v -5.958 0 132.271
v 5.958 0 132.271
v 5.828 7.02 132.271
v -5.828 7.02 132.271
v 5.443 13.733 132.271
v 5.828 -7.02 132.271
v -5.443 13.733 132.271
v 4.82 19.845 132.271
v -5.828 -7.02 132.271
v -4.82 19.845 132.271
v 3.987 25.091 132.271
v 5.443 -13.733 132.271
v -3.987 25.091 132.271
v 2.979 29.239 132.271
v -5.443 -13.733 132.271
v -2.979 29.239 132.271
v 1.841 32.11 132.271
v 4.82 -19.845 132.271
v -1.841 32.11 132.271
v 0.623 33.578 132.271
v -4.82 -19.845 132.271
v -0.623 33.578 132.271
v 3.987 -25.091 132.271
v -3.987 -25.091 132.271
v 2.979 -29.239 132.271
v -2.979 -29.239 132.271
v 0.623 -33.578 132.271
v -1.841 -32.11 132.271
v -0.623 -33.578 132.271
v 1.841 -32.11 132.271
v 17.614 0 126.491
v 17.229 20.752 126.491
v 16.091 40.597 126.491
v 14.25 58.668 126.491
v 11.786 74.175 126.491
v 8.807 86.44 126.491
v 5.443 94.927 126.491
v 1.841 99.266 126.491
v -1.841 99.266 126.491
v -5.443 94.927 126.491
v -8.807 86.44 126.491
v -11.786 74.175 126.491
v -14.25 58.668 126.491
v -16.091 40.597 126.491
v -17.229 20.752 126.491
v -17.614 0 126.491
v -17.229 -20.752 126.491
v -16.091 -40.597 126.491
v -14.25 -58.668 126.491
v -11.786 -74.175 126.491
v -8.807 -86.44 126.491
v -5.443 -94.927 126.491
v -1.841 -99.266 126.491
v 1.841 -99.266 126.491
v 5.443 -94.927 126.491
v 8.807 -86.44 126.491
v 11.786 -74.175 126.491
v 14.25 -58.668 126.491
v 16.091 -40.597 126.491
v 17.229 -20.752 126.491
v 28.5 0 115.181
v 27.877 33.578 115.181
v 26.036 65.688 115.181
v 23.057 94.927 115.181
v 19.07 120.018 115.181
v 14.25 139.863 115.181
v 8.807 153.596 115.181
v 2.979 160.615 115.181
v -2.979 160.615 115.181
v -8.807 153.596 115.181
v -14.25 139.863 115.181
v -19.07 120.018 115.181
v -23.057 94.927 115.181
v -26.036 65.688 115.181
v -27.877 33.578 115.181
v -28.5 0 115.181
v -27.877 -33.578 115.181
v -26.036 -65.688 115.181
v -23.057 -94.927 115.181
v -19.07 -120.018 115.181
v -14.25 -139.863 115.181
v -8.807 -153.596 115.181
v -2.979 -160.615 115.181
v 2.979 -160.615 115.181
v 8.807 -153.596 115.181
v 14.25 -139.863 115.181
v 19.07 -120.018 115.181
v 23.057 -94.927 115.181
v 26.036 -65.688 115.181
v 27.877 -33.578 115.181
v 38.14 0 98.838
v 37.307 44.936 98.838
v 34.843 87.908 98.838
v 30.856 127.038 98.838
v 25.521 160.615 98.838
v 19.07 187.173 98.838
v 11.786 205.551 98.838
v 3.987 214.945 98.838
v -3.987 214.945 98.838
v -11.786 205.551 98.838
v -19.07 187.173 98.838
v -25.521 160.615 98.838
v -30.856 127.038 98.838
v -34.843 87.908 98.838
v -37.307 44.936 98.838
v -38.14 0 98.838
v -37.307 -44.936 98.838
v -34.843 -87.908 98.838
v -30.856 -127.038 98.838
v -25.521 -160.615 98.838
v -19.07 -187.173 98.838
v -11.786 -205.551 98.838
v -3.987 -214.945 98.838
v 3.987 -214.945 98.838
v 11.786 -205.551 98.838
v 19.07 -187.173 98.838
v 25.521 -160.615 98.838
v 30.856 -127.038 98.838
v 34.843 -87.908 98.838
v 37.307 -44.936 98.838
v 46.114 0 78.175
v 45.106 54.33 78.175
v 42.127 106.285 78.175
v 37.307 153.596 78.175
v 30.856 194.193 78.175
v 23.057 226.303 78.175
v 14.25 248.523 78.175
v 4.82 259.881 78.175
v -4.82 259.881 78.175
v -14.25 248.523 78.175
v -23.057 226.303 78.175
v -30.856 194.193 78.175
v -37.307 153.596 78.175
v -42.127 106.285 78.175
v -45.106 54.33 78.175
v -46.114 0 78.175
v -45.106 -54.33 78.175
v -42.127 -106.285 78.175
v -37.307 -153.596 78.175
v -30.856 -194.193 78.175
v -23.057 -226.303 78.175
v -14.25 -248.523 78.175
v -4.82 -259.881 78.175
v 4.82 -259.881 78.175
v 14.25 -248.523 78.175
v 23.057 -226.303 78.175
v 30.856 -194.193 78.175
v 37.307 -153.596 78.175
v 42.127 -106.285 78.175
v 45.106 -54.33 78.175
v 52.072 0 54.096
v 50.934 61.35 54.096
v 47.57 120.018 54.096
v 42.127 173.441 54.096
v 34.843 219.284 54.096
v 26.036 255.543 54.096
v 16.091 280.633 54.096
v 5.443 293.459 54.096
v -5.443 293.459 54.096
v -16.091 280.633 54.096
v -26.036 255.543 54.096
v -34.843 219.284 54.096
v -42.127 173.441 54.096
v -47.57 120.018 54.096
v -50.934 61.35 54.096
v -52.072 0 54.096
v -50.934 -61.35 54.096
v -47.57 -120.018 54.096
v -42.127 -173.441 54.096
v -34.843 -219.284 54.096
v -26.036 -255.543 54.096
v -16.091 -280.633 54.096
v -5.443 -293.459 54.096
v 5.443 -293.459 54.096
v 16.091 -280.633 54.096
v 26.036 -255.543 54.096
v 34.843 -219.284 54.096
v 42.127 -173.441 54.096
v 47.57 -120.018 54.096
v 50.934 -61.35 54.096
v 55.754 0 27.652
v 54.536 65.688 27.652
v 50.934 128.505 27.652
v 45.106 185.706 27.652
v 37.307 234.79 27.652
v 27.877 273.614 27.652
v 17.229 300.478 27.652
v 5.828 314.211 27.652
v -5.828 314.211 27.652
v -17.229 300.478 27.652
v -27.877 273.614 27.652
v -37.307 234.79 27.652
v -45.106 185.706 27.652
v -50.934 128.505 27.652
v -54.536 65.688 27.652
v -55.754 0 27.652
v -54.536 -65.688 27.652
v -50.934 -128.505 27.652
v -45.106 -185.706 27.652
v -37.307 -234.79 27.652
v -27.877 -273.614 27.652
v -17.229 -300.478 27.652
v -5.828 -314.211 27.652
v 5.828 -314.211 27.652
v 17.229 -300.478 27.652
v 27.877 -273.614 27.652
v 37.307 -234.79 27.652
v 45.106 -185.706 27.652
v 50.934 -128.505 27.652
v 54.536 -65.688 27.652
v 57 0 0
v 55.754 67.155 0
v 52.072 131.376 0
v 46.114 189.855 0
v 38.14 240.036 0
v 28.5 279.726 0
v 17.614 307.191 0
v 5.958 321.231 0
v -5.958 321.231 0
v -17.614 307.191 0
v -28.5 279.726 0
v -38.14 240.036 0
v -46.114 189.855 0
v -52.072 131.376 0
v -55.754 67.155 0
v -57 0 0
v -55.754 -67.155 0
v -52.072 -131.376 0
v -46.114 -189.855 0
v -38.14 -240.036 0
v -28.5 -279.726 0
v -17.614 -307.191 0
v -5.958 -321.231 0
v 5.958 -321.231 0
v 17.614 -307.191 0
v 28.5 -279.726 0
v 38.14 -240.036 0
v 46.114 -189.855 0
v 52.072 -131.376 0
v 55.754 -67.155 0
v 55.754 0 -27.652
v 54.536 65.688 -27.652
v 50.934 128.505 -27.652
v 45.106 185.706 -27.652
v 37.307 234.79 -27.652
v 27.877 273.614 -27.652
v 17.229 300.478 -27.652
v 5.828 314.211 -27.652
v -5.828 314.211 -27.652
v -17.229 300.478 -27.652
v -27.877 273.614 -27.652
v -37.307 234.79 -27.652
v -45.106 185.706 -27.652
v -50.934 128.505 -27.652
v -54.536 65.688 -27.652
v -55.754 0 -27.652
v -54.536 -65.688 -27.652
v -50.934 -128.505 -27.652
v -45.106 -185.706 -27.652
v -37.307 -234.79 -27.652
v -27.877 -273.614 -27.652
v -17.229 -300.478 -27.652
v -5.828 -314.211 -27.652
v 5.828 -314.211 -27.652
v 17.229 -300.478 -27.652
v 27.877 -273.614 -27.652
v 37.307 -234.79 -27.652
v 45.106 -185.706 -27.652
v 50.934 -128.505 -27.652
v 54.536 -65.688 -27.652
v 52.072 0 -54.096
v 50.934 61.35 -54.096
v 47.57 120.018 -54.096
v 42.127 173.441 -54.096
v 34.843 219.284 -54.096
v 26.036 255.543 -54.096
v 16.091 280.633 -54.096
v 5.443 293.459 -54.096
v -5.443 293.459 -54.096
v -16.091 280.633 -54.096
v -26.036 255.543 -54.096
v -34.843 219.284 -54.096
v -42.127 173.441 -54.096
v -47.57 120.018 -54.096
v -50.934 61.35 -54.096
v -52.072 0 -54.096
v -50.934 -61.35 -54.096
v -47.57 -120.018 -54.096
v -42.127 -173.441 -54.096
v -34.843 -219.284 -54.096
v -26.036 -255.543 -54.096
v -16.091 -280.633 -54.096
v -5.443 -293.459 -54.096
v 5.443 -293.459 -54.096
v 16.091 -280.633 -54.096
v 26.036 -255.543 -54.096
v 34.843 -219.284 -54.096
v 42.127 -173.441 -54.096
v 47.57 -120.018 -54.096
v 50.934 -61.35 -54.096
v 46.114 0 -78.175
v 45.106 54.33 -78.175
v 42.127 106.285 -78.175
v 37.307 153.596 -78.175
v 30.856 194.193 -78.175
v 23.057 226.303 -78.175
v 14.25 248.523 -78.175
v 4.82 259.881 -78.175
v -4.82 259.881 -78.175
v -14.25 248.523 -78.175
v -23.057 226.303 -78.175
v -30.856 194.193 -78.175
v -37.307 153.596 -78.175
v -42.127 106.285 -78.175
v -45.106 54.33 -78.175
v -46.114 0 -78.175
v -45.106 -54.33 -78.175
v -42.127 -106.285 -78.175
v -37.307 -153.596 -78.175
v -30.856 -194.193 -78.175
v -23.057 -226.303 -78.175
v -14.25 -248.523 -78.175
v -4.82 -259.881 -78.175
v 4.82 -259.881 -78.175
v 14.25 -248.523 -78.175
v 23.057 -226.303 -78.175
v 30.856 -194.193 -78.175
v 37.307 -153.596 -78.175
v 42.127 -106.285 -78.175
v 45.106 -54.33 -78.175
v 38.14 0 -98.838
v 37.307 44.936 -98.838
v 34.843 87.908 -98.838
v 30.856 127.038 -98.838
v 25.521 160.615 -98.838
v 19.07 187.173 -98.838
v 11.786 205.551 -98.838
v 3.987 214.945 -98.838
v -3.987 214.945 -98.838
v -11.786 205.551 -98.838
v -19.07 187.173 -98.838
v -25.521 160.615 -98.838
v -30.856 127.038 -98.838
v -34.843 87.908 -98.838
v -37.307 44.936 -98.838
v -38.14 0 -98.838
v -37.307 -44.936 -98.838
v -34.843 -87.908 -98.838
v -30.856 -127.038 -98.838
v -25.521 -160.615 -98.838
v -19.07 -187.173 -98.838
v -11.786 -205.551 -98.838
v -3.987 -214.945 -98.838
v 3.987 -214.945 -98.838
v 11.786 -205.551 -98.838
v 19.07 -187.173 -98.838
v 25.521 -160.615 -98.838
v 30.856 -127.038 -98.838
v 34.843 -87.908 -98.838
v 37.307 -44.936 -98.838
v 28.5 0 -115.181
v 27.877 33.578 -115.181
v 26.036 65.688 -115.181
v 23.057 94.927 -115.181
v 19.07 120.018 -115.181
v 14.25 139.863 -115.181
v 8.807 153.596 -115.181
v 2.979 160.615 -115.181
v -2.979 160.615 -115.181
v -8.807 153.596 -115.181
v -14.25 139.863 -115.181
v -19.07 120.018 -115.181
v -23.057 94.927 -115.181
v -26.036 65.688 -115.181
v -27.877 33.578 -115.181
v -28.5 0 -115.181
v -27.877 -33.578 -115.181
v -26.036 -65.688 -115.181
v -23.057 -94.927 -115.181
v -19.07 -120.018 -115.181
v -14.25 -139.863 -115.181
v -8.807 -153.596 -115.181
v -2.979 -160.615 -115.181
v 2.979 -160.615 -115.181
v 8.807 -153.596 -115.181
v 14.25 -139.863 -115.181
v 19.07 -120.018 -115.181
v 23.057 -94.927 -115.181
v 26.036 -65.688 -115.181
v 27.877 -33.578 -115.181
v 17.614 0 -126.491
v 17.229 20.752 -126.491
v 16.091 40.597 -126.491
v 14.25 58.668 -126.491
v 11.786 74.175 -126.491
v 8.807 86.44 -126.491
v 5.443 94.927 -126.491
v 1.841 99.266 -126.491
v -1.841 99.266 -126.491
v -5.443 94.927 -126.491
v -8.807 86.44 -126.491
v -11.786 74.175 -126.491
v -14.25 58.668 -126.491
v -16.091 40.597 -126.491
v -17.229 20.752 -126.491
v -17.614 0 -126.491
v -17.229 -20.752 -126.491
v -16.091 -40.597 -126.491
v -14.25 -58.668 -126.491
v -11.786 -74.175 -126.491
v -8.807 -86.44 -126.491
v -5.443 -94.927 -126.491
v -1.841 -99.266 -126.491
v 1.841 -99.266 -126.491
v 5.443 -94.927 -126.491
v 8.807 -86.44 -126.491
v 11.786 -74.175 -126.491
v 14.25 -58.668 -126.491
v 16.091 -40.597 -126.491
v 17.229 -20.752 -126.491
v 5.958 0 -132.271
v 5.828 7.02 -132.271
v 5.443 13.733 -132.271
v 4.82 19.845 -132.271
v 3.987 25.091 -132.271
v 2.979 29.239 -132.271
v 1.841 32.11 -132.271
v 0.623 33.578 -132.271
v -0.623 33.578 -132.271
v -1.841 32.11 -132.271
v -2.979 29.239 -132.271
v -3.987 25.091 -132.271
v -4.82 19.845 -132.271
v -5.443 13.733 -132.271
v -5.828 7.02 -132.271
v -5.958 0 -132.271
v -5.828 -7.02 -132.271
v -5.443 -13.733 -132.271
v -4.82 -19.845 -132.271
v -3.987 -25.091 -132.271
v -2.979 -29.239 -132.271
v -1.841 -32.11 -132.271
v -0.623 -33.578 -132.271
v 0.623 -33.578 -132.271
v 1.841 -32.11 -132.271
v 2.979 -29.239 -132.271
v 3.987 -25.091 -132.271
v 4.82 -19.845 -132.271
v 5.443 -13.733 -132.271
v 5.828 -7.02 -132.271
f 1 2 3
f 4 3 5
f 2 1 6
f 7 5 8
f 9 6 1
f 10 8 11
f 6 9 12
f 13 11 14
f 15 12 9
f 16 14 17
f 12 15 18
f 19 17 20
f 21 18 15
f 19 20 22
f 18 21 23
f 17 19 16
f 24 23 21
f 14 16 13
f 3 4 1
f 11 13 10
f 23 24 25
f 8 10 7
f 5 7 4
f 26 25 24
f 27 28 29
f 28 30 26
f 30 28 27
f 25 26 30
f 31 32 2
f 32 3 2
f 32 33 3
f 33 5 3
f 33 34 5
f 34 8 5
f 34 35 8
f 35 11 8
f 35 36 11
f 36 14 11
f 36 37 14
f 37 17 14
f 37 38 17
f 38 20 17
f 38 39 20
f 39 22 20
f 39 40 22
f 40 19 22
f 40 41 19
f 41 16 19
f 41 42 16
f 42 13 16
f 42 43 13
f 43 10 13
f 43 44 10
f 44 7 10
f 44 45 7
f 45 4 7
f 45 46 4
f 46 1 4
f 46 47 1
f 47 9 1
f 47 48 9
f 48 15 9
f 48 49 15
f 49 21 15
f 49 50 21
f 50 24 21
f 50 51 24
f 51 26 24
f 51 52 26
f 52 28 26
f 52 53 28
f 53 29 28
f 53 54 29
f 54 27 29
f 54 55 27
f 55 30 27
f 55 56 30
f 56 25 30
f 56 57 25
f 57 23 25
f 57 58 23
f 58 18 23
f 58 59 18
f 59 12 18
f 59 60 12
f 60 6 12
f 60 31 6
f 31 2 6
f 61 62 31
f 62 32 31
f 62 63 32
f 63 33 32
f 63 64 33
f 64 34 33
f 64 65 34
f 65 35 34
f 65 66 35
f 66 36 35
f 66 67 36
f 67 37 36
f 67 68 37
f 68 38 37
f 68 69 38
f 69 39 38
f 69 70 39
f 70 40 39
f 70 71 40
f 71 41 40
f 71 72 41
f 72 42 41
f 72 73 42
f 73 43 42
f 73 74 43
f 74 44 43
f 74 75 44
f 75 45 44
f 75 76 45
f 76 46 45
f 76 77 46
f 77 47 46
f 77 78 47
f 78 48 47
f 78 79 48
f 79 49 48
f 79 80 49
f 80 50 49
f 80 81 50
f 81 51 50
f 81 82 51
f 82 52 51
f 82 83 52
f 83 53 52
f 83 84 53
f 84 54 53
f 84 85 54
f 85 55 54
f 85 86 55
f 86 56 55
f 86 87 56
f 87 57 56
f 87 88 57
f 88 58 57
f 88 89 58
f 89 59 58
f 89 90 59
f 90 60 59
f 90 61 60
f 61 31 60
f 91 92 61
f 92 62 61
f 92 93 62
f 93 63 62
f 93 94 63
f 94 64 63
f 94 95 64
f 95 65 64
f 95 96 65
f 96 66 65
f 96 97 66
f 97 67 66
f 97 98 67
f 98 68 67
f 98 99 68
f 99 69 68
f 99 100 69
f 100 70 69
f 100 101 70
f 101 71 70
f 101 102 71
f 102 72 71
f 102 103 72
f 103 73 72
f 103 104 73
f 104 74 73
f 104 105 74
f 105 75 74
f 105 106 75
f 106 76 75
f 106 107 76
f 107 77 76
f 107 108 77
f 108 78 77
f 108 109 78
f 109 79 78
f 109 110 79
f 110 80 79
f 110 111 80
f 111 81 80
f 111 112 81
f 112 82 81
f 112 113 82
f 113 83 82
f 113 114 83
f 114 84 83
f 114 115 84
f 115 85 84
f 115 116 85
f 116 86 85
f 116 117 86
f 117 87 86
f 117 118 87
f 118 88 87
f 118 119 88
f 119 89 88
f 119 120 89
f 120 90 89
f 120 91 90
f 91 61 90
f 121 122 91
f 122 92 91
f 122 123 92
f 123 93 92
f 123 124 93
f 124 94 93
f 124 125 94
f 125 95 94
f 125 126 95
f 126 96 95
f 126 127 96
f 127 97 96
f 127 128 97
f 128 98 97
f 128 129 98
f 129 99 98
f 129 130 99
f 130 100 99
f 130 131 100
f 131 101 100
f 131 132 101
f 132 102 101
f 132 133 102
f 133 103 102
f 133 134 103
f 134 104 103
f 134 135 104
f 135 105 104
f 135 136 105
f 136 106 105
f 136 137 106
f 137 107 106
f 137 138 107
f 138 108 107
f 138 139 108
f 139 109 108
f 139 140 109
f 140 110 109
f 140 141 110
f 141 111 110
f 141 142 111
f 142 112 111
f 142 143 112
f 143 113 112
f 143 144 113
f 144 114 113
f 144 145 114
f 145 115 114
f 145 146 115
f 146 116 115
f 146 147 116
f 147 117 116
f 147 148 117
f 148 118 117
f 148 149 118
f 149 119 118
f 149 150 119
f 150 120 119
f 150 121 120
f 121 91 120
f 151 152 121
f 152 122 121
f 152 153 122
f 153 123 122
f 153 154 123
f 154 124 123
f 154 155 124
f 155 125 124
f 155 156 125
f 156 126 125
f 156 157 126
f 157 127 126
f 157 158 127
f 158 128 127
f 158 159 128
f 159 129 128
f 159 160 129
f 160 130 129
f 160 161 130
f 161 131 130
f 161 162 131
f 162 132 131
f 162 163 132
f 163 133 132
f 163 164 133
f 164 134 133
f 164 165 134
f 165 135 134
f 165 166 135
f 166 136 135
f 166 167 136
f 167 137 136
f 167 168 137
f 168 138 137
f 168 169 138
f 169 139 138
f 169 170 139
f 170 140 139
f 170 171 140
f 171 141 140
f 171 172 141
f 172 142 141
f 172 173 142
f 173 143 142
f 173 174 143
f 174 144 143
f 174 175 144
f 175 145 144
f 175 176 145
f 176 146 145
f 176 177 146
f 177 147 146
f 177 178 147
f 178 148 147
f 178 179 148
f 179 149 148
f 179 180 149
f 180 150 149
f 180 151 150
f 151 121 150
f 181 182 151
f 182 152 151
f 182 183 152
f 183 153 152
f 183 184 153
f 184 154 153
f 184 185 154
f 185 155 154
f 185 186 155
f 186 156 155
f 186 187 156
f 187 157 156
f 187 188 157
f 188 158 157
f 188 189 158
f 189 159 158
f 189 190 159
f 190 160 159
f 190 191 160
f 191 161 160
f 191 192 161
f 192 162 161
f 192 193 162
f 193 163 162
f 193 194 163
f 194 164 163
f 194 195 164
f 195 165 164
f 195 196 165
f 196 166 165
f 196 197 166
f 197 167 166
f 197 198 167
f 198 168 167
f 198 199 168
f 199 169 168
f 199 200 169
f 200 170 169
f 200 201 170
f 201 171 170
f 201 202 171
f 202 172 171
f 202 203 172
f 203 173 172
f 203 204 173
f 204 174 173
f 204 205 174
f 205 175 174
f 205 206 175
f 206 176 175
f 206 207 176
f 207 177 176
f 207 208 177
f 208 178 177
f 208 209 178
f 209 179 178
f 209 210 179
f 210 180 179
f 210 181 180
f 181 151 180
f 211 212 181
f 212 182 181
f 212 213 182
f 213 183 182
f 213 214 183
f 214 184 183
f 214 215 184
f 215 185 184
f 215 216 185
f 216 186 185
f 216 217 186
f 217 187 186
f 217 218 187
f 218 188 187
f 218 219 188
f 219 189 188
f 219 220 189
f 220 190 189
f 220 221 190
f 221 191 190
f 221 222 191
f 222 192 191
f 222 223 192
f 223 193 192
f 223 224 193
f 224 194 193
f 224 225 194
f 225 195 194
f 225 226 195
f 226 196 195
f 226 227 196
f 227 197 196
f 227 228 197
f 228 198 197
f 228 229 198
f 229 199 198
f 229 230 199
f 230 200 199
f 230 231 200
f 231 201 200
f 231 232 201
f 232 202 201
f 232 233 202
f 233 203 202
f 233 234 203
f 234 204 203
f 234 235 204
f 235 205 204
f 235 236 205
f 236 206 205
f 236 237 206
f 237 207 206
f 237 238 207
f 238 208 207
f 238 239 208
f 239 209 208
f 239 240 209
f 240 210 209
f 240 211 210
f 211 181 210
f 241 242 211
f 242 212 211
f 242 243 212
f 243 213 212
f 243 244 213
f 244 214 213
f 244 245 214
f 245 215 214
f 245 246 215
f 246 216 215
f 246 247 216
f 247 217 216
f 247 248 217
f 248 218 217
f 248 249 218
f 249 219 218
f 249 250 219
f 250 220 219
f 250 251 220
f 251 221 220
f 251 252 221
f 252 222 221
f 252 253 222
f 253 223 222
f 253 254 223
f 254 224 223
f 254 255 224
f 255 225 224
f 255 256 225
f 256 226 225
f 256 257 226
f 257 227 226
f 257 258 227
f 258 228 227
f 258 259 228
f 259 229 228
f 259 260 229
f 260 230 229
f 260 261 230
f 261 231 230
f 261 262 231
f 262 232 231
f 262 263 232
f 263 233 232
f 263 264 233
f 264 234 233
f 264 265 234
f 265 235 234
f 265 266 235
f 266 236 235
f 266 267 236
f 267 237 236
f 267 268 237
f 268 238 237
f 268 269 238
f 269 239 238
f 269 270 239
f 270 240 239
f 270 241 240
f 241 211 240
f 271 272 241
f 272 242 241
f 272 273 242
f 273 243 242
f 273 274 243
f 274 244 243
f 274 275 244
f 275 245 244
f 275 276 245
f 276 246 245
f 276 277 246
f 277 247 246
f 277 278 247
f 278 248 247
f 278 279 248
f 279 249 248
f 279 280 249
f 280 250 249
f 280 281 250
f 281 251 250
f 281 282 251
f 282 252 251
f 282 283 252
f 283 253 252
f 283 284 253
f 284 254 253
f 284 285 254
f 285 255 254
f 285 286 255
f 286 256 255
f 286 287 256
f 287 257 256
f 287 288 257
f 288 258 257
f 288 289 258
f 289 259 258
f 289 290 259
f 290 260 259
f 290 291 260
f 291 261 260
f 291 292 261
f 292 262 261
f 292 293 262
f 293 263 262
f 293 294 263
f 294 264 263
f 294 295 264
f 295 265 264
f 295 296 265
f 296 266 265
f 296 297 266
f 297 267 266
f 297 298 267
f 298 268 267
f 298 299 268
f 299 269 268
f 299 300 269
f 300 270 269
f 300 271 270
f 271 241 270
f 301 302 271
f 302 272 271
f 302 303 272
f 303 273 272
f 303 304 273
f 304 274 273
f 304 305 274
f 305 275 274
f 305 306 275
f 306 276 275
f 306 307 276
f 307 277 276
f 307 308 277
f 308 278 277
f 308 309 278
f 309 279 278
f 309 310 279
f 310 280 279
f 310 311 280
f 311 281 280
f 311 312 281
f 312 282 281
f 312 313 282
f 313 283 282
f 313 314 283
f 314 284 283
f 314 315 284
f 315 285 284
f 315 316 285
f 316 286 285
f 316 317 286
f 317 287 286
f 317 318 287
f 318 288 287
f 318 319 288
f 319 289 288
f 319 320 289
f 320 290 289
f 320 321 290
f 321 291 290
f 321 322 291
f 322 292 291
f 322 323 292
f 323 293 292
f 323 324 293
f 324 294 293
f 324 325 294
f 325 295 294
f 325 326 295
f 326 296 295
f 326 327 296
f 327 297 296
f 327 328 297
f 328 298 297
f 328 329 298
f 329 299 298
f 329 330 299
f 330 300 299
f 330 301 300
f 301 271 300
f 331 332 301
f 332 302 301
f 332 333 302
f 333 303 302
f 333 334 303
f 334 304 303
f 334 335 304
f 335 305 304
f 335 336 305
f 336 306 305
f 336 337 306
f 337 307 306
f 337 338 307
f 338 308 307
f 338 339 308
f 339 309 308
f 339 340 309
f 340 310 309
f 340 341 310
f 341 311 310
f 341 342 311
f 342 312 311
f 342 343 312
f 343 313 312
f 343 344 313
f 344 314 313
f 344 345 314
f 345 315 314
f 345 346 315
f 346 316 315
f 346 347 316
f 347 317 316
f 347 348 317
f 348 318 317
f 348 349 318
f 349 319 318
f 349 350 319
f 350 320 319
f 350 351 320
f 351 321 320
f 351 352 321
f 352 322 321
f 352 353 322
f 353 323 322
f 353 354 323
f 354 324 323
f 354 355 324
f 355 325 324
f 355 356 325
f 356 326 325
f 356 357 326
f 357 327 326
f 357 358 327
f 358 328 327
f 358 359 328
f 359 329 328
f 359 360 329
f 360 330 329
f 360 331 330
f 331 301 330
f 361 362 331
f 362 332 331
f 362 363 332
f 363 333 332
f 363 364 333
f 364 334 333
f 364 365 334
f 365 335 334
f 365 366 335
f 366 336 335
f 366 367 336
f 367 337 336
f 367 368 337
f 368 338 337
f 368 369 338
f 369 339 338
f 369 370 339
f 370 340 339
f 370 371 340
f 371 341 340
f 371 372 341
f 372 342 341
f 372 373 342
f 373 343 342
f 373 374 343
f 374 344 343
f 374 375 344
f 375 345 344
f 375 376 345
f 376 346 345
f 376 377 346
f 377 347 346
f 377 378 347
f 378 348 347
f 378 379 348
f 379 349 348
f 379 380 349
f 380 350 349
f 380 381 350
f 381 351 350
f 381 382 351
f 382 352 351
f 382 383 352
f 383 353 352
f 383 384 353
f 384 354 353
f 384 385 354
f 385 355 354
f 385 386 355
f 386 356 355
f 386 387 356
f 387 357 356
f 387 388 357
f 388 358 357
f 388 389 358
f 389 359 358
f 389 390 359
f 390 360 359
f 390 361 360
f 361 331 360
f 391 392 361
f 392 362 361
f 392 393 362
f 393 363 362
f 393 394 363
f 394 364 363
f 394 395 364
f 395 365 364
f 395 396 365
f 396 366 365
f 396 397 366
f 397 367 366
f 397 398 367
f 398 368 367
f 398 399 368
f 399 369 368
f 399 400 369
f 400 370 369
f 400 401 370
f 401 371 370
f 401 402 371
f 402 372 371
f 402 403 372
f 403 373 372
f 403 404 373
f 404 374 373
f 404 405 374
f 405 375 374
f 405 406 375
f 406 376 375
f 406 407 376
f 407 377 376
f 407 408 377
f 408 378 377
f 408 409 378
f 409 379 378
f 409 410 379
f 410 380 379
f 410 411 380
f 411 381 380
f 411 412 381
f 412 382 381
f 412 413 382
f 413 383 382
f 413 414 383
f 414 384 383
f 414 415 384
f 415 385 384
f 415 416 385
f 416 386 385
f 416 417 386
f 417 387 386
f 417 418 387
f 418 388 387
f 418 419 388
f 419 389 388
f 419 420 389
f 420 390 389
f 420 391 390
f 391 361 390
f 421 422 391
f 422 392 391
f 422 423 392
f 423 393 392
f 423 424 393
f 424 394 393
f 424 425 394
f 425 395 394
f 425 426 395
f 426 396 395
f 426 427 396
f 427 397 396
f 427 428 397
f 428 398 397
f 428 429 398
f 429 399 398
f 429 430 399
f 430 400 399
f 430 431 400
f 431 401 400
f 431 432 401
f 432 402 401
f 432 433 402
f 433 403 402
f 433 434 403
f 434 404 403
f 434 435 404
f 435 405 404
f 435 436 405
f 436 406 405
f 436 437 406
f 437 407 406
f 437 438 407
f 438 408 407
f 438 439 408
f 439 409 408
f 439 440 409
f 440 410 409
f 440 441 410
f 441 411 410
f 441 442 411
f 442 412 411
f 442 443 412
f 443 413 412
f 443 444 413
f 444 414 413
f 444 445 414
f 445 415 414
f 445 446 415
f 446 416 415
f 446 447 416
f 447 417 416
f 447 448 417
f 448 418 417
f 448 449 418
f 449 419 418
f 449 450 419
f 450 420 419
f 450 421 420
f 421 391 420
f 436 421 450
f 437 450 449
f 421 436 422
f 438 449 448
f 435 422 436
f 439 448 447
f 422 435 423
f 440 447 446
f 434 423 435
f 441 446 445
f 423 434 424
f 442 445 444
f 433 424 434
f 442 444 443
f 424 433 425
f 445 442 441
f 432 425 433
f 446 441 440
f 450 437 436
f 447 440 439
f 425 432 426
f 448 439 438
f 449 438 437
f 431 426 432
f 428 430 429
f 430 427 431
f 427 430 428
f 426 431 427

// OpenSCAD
// Generated by SolidPython 1.0.1 on 2020-07-29 00:46:45


scale(v = [3, 17, 7]) {
	sphere(r = 19);
}
/***********************************************
*********      SolidPython code:      **********
************************************************
 
# import packages: SolidPython
from solid import *
from solid.utils import *
from itertools import chain, combinations, permutations


class Resize:

    def __init__(self, scad_file):
        self.scad_file = scad_file
        #self.scad_file = import_scad(scad_file)
        # cone/cylinder param:
        self.r1 = 0
        self.r2 = 0
        self.h = 0
        # rectangular prism param:
        self.w = 0
        self.l = 0
        # ellipse param:
        self.r = 0

    # import OpenScad code (file name corresponds to shape)


    # classify shape + parameters
    def assign(self, param1, param2, param3):
        if self.scad_file == 'cone.scad':
            self.r1 = param1
            self.r2 = param2
            self.h = param3
        elif self.scad_file == 'cylinder.scad':
            self.r1 = param1
            self.r2 = param2
            self.h = param3
        elif self.scad_file == 'rectangularPrism.scad':
            self.h = param1
            self.l = param2
            self.w = param3
        else:
            self.r = param1
            self.h = param2

    # resize parameters
    def iterate(self):
        x = range(3, 20, 2)
        i = 1
        if self.scad_file == 'cone.scad':
            tempList = list(permutations(x, 2))
            for temp in tempList:
                param1 = temp[0]
                param2 = temp[1]
                filepath = 'produced_scad_files/' + 'cone' + str(param1) + '_' + str(param2) + '_' + '.scad'
                scad_render_to_file(cylinder(h=param1, r1=param2, r2=0), filepath)

        elif self.scad_file == 'cylinder.scad':
            tempList = list(permutations(x, 3))
            for temp in tempList:
                param1 = temp[0]
                param2 = temp[1]
                filepath = 'produced_scad_files/' + 'cylinder' + str(param1) + '_' + str(param2) + '_' + '.scad'
                scad_render_to_file(cylinder(h=param1, r1=param2, r2=param2), filepath)

        elif self.scad_file == 'rectangularPrism.scad':
            tempList = list(permutations(x, 3))
            for temp in tempList:
                param1 = temp[0]
                param2 = temp[1]
                param3 = temp[2]
                filepath = 'produced_scad_files/' + 'rectangularPrism' + str(param1) + '_' + str(param2) + '_' + str(
                    param3) + '.scad'
                scad_render_to_file(cube(size=(param1, param2, param3)), filepath)

        elif self.scad_file == 'ellipse.scad':
            tempList = list(permutations(x, 4))
            for temp in tempList:
                param1 = temp[0]
                param2 = temp[1]
                param3 = temp[2]
                param4 = temp[3]
                filepath = 'produced_scad_files/' + 'ellipse' + str(param1) + '_' + str(param2) + '_' + str(param3) + '_' + str(param4) + '.scad'
                scad_render_to_file(scale([param1, param2, param3])(sphere(r=param4)), filepath)

    def render_to_scadfile(self):
        scad_render_to_file(scad, 'example.scad') 
 
************************************************/
